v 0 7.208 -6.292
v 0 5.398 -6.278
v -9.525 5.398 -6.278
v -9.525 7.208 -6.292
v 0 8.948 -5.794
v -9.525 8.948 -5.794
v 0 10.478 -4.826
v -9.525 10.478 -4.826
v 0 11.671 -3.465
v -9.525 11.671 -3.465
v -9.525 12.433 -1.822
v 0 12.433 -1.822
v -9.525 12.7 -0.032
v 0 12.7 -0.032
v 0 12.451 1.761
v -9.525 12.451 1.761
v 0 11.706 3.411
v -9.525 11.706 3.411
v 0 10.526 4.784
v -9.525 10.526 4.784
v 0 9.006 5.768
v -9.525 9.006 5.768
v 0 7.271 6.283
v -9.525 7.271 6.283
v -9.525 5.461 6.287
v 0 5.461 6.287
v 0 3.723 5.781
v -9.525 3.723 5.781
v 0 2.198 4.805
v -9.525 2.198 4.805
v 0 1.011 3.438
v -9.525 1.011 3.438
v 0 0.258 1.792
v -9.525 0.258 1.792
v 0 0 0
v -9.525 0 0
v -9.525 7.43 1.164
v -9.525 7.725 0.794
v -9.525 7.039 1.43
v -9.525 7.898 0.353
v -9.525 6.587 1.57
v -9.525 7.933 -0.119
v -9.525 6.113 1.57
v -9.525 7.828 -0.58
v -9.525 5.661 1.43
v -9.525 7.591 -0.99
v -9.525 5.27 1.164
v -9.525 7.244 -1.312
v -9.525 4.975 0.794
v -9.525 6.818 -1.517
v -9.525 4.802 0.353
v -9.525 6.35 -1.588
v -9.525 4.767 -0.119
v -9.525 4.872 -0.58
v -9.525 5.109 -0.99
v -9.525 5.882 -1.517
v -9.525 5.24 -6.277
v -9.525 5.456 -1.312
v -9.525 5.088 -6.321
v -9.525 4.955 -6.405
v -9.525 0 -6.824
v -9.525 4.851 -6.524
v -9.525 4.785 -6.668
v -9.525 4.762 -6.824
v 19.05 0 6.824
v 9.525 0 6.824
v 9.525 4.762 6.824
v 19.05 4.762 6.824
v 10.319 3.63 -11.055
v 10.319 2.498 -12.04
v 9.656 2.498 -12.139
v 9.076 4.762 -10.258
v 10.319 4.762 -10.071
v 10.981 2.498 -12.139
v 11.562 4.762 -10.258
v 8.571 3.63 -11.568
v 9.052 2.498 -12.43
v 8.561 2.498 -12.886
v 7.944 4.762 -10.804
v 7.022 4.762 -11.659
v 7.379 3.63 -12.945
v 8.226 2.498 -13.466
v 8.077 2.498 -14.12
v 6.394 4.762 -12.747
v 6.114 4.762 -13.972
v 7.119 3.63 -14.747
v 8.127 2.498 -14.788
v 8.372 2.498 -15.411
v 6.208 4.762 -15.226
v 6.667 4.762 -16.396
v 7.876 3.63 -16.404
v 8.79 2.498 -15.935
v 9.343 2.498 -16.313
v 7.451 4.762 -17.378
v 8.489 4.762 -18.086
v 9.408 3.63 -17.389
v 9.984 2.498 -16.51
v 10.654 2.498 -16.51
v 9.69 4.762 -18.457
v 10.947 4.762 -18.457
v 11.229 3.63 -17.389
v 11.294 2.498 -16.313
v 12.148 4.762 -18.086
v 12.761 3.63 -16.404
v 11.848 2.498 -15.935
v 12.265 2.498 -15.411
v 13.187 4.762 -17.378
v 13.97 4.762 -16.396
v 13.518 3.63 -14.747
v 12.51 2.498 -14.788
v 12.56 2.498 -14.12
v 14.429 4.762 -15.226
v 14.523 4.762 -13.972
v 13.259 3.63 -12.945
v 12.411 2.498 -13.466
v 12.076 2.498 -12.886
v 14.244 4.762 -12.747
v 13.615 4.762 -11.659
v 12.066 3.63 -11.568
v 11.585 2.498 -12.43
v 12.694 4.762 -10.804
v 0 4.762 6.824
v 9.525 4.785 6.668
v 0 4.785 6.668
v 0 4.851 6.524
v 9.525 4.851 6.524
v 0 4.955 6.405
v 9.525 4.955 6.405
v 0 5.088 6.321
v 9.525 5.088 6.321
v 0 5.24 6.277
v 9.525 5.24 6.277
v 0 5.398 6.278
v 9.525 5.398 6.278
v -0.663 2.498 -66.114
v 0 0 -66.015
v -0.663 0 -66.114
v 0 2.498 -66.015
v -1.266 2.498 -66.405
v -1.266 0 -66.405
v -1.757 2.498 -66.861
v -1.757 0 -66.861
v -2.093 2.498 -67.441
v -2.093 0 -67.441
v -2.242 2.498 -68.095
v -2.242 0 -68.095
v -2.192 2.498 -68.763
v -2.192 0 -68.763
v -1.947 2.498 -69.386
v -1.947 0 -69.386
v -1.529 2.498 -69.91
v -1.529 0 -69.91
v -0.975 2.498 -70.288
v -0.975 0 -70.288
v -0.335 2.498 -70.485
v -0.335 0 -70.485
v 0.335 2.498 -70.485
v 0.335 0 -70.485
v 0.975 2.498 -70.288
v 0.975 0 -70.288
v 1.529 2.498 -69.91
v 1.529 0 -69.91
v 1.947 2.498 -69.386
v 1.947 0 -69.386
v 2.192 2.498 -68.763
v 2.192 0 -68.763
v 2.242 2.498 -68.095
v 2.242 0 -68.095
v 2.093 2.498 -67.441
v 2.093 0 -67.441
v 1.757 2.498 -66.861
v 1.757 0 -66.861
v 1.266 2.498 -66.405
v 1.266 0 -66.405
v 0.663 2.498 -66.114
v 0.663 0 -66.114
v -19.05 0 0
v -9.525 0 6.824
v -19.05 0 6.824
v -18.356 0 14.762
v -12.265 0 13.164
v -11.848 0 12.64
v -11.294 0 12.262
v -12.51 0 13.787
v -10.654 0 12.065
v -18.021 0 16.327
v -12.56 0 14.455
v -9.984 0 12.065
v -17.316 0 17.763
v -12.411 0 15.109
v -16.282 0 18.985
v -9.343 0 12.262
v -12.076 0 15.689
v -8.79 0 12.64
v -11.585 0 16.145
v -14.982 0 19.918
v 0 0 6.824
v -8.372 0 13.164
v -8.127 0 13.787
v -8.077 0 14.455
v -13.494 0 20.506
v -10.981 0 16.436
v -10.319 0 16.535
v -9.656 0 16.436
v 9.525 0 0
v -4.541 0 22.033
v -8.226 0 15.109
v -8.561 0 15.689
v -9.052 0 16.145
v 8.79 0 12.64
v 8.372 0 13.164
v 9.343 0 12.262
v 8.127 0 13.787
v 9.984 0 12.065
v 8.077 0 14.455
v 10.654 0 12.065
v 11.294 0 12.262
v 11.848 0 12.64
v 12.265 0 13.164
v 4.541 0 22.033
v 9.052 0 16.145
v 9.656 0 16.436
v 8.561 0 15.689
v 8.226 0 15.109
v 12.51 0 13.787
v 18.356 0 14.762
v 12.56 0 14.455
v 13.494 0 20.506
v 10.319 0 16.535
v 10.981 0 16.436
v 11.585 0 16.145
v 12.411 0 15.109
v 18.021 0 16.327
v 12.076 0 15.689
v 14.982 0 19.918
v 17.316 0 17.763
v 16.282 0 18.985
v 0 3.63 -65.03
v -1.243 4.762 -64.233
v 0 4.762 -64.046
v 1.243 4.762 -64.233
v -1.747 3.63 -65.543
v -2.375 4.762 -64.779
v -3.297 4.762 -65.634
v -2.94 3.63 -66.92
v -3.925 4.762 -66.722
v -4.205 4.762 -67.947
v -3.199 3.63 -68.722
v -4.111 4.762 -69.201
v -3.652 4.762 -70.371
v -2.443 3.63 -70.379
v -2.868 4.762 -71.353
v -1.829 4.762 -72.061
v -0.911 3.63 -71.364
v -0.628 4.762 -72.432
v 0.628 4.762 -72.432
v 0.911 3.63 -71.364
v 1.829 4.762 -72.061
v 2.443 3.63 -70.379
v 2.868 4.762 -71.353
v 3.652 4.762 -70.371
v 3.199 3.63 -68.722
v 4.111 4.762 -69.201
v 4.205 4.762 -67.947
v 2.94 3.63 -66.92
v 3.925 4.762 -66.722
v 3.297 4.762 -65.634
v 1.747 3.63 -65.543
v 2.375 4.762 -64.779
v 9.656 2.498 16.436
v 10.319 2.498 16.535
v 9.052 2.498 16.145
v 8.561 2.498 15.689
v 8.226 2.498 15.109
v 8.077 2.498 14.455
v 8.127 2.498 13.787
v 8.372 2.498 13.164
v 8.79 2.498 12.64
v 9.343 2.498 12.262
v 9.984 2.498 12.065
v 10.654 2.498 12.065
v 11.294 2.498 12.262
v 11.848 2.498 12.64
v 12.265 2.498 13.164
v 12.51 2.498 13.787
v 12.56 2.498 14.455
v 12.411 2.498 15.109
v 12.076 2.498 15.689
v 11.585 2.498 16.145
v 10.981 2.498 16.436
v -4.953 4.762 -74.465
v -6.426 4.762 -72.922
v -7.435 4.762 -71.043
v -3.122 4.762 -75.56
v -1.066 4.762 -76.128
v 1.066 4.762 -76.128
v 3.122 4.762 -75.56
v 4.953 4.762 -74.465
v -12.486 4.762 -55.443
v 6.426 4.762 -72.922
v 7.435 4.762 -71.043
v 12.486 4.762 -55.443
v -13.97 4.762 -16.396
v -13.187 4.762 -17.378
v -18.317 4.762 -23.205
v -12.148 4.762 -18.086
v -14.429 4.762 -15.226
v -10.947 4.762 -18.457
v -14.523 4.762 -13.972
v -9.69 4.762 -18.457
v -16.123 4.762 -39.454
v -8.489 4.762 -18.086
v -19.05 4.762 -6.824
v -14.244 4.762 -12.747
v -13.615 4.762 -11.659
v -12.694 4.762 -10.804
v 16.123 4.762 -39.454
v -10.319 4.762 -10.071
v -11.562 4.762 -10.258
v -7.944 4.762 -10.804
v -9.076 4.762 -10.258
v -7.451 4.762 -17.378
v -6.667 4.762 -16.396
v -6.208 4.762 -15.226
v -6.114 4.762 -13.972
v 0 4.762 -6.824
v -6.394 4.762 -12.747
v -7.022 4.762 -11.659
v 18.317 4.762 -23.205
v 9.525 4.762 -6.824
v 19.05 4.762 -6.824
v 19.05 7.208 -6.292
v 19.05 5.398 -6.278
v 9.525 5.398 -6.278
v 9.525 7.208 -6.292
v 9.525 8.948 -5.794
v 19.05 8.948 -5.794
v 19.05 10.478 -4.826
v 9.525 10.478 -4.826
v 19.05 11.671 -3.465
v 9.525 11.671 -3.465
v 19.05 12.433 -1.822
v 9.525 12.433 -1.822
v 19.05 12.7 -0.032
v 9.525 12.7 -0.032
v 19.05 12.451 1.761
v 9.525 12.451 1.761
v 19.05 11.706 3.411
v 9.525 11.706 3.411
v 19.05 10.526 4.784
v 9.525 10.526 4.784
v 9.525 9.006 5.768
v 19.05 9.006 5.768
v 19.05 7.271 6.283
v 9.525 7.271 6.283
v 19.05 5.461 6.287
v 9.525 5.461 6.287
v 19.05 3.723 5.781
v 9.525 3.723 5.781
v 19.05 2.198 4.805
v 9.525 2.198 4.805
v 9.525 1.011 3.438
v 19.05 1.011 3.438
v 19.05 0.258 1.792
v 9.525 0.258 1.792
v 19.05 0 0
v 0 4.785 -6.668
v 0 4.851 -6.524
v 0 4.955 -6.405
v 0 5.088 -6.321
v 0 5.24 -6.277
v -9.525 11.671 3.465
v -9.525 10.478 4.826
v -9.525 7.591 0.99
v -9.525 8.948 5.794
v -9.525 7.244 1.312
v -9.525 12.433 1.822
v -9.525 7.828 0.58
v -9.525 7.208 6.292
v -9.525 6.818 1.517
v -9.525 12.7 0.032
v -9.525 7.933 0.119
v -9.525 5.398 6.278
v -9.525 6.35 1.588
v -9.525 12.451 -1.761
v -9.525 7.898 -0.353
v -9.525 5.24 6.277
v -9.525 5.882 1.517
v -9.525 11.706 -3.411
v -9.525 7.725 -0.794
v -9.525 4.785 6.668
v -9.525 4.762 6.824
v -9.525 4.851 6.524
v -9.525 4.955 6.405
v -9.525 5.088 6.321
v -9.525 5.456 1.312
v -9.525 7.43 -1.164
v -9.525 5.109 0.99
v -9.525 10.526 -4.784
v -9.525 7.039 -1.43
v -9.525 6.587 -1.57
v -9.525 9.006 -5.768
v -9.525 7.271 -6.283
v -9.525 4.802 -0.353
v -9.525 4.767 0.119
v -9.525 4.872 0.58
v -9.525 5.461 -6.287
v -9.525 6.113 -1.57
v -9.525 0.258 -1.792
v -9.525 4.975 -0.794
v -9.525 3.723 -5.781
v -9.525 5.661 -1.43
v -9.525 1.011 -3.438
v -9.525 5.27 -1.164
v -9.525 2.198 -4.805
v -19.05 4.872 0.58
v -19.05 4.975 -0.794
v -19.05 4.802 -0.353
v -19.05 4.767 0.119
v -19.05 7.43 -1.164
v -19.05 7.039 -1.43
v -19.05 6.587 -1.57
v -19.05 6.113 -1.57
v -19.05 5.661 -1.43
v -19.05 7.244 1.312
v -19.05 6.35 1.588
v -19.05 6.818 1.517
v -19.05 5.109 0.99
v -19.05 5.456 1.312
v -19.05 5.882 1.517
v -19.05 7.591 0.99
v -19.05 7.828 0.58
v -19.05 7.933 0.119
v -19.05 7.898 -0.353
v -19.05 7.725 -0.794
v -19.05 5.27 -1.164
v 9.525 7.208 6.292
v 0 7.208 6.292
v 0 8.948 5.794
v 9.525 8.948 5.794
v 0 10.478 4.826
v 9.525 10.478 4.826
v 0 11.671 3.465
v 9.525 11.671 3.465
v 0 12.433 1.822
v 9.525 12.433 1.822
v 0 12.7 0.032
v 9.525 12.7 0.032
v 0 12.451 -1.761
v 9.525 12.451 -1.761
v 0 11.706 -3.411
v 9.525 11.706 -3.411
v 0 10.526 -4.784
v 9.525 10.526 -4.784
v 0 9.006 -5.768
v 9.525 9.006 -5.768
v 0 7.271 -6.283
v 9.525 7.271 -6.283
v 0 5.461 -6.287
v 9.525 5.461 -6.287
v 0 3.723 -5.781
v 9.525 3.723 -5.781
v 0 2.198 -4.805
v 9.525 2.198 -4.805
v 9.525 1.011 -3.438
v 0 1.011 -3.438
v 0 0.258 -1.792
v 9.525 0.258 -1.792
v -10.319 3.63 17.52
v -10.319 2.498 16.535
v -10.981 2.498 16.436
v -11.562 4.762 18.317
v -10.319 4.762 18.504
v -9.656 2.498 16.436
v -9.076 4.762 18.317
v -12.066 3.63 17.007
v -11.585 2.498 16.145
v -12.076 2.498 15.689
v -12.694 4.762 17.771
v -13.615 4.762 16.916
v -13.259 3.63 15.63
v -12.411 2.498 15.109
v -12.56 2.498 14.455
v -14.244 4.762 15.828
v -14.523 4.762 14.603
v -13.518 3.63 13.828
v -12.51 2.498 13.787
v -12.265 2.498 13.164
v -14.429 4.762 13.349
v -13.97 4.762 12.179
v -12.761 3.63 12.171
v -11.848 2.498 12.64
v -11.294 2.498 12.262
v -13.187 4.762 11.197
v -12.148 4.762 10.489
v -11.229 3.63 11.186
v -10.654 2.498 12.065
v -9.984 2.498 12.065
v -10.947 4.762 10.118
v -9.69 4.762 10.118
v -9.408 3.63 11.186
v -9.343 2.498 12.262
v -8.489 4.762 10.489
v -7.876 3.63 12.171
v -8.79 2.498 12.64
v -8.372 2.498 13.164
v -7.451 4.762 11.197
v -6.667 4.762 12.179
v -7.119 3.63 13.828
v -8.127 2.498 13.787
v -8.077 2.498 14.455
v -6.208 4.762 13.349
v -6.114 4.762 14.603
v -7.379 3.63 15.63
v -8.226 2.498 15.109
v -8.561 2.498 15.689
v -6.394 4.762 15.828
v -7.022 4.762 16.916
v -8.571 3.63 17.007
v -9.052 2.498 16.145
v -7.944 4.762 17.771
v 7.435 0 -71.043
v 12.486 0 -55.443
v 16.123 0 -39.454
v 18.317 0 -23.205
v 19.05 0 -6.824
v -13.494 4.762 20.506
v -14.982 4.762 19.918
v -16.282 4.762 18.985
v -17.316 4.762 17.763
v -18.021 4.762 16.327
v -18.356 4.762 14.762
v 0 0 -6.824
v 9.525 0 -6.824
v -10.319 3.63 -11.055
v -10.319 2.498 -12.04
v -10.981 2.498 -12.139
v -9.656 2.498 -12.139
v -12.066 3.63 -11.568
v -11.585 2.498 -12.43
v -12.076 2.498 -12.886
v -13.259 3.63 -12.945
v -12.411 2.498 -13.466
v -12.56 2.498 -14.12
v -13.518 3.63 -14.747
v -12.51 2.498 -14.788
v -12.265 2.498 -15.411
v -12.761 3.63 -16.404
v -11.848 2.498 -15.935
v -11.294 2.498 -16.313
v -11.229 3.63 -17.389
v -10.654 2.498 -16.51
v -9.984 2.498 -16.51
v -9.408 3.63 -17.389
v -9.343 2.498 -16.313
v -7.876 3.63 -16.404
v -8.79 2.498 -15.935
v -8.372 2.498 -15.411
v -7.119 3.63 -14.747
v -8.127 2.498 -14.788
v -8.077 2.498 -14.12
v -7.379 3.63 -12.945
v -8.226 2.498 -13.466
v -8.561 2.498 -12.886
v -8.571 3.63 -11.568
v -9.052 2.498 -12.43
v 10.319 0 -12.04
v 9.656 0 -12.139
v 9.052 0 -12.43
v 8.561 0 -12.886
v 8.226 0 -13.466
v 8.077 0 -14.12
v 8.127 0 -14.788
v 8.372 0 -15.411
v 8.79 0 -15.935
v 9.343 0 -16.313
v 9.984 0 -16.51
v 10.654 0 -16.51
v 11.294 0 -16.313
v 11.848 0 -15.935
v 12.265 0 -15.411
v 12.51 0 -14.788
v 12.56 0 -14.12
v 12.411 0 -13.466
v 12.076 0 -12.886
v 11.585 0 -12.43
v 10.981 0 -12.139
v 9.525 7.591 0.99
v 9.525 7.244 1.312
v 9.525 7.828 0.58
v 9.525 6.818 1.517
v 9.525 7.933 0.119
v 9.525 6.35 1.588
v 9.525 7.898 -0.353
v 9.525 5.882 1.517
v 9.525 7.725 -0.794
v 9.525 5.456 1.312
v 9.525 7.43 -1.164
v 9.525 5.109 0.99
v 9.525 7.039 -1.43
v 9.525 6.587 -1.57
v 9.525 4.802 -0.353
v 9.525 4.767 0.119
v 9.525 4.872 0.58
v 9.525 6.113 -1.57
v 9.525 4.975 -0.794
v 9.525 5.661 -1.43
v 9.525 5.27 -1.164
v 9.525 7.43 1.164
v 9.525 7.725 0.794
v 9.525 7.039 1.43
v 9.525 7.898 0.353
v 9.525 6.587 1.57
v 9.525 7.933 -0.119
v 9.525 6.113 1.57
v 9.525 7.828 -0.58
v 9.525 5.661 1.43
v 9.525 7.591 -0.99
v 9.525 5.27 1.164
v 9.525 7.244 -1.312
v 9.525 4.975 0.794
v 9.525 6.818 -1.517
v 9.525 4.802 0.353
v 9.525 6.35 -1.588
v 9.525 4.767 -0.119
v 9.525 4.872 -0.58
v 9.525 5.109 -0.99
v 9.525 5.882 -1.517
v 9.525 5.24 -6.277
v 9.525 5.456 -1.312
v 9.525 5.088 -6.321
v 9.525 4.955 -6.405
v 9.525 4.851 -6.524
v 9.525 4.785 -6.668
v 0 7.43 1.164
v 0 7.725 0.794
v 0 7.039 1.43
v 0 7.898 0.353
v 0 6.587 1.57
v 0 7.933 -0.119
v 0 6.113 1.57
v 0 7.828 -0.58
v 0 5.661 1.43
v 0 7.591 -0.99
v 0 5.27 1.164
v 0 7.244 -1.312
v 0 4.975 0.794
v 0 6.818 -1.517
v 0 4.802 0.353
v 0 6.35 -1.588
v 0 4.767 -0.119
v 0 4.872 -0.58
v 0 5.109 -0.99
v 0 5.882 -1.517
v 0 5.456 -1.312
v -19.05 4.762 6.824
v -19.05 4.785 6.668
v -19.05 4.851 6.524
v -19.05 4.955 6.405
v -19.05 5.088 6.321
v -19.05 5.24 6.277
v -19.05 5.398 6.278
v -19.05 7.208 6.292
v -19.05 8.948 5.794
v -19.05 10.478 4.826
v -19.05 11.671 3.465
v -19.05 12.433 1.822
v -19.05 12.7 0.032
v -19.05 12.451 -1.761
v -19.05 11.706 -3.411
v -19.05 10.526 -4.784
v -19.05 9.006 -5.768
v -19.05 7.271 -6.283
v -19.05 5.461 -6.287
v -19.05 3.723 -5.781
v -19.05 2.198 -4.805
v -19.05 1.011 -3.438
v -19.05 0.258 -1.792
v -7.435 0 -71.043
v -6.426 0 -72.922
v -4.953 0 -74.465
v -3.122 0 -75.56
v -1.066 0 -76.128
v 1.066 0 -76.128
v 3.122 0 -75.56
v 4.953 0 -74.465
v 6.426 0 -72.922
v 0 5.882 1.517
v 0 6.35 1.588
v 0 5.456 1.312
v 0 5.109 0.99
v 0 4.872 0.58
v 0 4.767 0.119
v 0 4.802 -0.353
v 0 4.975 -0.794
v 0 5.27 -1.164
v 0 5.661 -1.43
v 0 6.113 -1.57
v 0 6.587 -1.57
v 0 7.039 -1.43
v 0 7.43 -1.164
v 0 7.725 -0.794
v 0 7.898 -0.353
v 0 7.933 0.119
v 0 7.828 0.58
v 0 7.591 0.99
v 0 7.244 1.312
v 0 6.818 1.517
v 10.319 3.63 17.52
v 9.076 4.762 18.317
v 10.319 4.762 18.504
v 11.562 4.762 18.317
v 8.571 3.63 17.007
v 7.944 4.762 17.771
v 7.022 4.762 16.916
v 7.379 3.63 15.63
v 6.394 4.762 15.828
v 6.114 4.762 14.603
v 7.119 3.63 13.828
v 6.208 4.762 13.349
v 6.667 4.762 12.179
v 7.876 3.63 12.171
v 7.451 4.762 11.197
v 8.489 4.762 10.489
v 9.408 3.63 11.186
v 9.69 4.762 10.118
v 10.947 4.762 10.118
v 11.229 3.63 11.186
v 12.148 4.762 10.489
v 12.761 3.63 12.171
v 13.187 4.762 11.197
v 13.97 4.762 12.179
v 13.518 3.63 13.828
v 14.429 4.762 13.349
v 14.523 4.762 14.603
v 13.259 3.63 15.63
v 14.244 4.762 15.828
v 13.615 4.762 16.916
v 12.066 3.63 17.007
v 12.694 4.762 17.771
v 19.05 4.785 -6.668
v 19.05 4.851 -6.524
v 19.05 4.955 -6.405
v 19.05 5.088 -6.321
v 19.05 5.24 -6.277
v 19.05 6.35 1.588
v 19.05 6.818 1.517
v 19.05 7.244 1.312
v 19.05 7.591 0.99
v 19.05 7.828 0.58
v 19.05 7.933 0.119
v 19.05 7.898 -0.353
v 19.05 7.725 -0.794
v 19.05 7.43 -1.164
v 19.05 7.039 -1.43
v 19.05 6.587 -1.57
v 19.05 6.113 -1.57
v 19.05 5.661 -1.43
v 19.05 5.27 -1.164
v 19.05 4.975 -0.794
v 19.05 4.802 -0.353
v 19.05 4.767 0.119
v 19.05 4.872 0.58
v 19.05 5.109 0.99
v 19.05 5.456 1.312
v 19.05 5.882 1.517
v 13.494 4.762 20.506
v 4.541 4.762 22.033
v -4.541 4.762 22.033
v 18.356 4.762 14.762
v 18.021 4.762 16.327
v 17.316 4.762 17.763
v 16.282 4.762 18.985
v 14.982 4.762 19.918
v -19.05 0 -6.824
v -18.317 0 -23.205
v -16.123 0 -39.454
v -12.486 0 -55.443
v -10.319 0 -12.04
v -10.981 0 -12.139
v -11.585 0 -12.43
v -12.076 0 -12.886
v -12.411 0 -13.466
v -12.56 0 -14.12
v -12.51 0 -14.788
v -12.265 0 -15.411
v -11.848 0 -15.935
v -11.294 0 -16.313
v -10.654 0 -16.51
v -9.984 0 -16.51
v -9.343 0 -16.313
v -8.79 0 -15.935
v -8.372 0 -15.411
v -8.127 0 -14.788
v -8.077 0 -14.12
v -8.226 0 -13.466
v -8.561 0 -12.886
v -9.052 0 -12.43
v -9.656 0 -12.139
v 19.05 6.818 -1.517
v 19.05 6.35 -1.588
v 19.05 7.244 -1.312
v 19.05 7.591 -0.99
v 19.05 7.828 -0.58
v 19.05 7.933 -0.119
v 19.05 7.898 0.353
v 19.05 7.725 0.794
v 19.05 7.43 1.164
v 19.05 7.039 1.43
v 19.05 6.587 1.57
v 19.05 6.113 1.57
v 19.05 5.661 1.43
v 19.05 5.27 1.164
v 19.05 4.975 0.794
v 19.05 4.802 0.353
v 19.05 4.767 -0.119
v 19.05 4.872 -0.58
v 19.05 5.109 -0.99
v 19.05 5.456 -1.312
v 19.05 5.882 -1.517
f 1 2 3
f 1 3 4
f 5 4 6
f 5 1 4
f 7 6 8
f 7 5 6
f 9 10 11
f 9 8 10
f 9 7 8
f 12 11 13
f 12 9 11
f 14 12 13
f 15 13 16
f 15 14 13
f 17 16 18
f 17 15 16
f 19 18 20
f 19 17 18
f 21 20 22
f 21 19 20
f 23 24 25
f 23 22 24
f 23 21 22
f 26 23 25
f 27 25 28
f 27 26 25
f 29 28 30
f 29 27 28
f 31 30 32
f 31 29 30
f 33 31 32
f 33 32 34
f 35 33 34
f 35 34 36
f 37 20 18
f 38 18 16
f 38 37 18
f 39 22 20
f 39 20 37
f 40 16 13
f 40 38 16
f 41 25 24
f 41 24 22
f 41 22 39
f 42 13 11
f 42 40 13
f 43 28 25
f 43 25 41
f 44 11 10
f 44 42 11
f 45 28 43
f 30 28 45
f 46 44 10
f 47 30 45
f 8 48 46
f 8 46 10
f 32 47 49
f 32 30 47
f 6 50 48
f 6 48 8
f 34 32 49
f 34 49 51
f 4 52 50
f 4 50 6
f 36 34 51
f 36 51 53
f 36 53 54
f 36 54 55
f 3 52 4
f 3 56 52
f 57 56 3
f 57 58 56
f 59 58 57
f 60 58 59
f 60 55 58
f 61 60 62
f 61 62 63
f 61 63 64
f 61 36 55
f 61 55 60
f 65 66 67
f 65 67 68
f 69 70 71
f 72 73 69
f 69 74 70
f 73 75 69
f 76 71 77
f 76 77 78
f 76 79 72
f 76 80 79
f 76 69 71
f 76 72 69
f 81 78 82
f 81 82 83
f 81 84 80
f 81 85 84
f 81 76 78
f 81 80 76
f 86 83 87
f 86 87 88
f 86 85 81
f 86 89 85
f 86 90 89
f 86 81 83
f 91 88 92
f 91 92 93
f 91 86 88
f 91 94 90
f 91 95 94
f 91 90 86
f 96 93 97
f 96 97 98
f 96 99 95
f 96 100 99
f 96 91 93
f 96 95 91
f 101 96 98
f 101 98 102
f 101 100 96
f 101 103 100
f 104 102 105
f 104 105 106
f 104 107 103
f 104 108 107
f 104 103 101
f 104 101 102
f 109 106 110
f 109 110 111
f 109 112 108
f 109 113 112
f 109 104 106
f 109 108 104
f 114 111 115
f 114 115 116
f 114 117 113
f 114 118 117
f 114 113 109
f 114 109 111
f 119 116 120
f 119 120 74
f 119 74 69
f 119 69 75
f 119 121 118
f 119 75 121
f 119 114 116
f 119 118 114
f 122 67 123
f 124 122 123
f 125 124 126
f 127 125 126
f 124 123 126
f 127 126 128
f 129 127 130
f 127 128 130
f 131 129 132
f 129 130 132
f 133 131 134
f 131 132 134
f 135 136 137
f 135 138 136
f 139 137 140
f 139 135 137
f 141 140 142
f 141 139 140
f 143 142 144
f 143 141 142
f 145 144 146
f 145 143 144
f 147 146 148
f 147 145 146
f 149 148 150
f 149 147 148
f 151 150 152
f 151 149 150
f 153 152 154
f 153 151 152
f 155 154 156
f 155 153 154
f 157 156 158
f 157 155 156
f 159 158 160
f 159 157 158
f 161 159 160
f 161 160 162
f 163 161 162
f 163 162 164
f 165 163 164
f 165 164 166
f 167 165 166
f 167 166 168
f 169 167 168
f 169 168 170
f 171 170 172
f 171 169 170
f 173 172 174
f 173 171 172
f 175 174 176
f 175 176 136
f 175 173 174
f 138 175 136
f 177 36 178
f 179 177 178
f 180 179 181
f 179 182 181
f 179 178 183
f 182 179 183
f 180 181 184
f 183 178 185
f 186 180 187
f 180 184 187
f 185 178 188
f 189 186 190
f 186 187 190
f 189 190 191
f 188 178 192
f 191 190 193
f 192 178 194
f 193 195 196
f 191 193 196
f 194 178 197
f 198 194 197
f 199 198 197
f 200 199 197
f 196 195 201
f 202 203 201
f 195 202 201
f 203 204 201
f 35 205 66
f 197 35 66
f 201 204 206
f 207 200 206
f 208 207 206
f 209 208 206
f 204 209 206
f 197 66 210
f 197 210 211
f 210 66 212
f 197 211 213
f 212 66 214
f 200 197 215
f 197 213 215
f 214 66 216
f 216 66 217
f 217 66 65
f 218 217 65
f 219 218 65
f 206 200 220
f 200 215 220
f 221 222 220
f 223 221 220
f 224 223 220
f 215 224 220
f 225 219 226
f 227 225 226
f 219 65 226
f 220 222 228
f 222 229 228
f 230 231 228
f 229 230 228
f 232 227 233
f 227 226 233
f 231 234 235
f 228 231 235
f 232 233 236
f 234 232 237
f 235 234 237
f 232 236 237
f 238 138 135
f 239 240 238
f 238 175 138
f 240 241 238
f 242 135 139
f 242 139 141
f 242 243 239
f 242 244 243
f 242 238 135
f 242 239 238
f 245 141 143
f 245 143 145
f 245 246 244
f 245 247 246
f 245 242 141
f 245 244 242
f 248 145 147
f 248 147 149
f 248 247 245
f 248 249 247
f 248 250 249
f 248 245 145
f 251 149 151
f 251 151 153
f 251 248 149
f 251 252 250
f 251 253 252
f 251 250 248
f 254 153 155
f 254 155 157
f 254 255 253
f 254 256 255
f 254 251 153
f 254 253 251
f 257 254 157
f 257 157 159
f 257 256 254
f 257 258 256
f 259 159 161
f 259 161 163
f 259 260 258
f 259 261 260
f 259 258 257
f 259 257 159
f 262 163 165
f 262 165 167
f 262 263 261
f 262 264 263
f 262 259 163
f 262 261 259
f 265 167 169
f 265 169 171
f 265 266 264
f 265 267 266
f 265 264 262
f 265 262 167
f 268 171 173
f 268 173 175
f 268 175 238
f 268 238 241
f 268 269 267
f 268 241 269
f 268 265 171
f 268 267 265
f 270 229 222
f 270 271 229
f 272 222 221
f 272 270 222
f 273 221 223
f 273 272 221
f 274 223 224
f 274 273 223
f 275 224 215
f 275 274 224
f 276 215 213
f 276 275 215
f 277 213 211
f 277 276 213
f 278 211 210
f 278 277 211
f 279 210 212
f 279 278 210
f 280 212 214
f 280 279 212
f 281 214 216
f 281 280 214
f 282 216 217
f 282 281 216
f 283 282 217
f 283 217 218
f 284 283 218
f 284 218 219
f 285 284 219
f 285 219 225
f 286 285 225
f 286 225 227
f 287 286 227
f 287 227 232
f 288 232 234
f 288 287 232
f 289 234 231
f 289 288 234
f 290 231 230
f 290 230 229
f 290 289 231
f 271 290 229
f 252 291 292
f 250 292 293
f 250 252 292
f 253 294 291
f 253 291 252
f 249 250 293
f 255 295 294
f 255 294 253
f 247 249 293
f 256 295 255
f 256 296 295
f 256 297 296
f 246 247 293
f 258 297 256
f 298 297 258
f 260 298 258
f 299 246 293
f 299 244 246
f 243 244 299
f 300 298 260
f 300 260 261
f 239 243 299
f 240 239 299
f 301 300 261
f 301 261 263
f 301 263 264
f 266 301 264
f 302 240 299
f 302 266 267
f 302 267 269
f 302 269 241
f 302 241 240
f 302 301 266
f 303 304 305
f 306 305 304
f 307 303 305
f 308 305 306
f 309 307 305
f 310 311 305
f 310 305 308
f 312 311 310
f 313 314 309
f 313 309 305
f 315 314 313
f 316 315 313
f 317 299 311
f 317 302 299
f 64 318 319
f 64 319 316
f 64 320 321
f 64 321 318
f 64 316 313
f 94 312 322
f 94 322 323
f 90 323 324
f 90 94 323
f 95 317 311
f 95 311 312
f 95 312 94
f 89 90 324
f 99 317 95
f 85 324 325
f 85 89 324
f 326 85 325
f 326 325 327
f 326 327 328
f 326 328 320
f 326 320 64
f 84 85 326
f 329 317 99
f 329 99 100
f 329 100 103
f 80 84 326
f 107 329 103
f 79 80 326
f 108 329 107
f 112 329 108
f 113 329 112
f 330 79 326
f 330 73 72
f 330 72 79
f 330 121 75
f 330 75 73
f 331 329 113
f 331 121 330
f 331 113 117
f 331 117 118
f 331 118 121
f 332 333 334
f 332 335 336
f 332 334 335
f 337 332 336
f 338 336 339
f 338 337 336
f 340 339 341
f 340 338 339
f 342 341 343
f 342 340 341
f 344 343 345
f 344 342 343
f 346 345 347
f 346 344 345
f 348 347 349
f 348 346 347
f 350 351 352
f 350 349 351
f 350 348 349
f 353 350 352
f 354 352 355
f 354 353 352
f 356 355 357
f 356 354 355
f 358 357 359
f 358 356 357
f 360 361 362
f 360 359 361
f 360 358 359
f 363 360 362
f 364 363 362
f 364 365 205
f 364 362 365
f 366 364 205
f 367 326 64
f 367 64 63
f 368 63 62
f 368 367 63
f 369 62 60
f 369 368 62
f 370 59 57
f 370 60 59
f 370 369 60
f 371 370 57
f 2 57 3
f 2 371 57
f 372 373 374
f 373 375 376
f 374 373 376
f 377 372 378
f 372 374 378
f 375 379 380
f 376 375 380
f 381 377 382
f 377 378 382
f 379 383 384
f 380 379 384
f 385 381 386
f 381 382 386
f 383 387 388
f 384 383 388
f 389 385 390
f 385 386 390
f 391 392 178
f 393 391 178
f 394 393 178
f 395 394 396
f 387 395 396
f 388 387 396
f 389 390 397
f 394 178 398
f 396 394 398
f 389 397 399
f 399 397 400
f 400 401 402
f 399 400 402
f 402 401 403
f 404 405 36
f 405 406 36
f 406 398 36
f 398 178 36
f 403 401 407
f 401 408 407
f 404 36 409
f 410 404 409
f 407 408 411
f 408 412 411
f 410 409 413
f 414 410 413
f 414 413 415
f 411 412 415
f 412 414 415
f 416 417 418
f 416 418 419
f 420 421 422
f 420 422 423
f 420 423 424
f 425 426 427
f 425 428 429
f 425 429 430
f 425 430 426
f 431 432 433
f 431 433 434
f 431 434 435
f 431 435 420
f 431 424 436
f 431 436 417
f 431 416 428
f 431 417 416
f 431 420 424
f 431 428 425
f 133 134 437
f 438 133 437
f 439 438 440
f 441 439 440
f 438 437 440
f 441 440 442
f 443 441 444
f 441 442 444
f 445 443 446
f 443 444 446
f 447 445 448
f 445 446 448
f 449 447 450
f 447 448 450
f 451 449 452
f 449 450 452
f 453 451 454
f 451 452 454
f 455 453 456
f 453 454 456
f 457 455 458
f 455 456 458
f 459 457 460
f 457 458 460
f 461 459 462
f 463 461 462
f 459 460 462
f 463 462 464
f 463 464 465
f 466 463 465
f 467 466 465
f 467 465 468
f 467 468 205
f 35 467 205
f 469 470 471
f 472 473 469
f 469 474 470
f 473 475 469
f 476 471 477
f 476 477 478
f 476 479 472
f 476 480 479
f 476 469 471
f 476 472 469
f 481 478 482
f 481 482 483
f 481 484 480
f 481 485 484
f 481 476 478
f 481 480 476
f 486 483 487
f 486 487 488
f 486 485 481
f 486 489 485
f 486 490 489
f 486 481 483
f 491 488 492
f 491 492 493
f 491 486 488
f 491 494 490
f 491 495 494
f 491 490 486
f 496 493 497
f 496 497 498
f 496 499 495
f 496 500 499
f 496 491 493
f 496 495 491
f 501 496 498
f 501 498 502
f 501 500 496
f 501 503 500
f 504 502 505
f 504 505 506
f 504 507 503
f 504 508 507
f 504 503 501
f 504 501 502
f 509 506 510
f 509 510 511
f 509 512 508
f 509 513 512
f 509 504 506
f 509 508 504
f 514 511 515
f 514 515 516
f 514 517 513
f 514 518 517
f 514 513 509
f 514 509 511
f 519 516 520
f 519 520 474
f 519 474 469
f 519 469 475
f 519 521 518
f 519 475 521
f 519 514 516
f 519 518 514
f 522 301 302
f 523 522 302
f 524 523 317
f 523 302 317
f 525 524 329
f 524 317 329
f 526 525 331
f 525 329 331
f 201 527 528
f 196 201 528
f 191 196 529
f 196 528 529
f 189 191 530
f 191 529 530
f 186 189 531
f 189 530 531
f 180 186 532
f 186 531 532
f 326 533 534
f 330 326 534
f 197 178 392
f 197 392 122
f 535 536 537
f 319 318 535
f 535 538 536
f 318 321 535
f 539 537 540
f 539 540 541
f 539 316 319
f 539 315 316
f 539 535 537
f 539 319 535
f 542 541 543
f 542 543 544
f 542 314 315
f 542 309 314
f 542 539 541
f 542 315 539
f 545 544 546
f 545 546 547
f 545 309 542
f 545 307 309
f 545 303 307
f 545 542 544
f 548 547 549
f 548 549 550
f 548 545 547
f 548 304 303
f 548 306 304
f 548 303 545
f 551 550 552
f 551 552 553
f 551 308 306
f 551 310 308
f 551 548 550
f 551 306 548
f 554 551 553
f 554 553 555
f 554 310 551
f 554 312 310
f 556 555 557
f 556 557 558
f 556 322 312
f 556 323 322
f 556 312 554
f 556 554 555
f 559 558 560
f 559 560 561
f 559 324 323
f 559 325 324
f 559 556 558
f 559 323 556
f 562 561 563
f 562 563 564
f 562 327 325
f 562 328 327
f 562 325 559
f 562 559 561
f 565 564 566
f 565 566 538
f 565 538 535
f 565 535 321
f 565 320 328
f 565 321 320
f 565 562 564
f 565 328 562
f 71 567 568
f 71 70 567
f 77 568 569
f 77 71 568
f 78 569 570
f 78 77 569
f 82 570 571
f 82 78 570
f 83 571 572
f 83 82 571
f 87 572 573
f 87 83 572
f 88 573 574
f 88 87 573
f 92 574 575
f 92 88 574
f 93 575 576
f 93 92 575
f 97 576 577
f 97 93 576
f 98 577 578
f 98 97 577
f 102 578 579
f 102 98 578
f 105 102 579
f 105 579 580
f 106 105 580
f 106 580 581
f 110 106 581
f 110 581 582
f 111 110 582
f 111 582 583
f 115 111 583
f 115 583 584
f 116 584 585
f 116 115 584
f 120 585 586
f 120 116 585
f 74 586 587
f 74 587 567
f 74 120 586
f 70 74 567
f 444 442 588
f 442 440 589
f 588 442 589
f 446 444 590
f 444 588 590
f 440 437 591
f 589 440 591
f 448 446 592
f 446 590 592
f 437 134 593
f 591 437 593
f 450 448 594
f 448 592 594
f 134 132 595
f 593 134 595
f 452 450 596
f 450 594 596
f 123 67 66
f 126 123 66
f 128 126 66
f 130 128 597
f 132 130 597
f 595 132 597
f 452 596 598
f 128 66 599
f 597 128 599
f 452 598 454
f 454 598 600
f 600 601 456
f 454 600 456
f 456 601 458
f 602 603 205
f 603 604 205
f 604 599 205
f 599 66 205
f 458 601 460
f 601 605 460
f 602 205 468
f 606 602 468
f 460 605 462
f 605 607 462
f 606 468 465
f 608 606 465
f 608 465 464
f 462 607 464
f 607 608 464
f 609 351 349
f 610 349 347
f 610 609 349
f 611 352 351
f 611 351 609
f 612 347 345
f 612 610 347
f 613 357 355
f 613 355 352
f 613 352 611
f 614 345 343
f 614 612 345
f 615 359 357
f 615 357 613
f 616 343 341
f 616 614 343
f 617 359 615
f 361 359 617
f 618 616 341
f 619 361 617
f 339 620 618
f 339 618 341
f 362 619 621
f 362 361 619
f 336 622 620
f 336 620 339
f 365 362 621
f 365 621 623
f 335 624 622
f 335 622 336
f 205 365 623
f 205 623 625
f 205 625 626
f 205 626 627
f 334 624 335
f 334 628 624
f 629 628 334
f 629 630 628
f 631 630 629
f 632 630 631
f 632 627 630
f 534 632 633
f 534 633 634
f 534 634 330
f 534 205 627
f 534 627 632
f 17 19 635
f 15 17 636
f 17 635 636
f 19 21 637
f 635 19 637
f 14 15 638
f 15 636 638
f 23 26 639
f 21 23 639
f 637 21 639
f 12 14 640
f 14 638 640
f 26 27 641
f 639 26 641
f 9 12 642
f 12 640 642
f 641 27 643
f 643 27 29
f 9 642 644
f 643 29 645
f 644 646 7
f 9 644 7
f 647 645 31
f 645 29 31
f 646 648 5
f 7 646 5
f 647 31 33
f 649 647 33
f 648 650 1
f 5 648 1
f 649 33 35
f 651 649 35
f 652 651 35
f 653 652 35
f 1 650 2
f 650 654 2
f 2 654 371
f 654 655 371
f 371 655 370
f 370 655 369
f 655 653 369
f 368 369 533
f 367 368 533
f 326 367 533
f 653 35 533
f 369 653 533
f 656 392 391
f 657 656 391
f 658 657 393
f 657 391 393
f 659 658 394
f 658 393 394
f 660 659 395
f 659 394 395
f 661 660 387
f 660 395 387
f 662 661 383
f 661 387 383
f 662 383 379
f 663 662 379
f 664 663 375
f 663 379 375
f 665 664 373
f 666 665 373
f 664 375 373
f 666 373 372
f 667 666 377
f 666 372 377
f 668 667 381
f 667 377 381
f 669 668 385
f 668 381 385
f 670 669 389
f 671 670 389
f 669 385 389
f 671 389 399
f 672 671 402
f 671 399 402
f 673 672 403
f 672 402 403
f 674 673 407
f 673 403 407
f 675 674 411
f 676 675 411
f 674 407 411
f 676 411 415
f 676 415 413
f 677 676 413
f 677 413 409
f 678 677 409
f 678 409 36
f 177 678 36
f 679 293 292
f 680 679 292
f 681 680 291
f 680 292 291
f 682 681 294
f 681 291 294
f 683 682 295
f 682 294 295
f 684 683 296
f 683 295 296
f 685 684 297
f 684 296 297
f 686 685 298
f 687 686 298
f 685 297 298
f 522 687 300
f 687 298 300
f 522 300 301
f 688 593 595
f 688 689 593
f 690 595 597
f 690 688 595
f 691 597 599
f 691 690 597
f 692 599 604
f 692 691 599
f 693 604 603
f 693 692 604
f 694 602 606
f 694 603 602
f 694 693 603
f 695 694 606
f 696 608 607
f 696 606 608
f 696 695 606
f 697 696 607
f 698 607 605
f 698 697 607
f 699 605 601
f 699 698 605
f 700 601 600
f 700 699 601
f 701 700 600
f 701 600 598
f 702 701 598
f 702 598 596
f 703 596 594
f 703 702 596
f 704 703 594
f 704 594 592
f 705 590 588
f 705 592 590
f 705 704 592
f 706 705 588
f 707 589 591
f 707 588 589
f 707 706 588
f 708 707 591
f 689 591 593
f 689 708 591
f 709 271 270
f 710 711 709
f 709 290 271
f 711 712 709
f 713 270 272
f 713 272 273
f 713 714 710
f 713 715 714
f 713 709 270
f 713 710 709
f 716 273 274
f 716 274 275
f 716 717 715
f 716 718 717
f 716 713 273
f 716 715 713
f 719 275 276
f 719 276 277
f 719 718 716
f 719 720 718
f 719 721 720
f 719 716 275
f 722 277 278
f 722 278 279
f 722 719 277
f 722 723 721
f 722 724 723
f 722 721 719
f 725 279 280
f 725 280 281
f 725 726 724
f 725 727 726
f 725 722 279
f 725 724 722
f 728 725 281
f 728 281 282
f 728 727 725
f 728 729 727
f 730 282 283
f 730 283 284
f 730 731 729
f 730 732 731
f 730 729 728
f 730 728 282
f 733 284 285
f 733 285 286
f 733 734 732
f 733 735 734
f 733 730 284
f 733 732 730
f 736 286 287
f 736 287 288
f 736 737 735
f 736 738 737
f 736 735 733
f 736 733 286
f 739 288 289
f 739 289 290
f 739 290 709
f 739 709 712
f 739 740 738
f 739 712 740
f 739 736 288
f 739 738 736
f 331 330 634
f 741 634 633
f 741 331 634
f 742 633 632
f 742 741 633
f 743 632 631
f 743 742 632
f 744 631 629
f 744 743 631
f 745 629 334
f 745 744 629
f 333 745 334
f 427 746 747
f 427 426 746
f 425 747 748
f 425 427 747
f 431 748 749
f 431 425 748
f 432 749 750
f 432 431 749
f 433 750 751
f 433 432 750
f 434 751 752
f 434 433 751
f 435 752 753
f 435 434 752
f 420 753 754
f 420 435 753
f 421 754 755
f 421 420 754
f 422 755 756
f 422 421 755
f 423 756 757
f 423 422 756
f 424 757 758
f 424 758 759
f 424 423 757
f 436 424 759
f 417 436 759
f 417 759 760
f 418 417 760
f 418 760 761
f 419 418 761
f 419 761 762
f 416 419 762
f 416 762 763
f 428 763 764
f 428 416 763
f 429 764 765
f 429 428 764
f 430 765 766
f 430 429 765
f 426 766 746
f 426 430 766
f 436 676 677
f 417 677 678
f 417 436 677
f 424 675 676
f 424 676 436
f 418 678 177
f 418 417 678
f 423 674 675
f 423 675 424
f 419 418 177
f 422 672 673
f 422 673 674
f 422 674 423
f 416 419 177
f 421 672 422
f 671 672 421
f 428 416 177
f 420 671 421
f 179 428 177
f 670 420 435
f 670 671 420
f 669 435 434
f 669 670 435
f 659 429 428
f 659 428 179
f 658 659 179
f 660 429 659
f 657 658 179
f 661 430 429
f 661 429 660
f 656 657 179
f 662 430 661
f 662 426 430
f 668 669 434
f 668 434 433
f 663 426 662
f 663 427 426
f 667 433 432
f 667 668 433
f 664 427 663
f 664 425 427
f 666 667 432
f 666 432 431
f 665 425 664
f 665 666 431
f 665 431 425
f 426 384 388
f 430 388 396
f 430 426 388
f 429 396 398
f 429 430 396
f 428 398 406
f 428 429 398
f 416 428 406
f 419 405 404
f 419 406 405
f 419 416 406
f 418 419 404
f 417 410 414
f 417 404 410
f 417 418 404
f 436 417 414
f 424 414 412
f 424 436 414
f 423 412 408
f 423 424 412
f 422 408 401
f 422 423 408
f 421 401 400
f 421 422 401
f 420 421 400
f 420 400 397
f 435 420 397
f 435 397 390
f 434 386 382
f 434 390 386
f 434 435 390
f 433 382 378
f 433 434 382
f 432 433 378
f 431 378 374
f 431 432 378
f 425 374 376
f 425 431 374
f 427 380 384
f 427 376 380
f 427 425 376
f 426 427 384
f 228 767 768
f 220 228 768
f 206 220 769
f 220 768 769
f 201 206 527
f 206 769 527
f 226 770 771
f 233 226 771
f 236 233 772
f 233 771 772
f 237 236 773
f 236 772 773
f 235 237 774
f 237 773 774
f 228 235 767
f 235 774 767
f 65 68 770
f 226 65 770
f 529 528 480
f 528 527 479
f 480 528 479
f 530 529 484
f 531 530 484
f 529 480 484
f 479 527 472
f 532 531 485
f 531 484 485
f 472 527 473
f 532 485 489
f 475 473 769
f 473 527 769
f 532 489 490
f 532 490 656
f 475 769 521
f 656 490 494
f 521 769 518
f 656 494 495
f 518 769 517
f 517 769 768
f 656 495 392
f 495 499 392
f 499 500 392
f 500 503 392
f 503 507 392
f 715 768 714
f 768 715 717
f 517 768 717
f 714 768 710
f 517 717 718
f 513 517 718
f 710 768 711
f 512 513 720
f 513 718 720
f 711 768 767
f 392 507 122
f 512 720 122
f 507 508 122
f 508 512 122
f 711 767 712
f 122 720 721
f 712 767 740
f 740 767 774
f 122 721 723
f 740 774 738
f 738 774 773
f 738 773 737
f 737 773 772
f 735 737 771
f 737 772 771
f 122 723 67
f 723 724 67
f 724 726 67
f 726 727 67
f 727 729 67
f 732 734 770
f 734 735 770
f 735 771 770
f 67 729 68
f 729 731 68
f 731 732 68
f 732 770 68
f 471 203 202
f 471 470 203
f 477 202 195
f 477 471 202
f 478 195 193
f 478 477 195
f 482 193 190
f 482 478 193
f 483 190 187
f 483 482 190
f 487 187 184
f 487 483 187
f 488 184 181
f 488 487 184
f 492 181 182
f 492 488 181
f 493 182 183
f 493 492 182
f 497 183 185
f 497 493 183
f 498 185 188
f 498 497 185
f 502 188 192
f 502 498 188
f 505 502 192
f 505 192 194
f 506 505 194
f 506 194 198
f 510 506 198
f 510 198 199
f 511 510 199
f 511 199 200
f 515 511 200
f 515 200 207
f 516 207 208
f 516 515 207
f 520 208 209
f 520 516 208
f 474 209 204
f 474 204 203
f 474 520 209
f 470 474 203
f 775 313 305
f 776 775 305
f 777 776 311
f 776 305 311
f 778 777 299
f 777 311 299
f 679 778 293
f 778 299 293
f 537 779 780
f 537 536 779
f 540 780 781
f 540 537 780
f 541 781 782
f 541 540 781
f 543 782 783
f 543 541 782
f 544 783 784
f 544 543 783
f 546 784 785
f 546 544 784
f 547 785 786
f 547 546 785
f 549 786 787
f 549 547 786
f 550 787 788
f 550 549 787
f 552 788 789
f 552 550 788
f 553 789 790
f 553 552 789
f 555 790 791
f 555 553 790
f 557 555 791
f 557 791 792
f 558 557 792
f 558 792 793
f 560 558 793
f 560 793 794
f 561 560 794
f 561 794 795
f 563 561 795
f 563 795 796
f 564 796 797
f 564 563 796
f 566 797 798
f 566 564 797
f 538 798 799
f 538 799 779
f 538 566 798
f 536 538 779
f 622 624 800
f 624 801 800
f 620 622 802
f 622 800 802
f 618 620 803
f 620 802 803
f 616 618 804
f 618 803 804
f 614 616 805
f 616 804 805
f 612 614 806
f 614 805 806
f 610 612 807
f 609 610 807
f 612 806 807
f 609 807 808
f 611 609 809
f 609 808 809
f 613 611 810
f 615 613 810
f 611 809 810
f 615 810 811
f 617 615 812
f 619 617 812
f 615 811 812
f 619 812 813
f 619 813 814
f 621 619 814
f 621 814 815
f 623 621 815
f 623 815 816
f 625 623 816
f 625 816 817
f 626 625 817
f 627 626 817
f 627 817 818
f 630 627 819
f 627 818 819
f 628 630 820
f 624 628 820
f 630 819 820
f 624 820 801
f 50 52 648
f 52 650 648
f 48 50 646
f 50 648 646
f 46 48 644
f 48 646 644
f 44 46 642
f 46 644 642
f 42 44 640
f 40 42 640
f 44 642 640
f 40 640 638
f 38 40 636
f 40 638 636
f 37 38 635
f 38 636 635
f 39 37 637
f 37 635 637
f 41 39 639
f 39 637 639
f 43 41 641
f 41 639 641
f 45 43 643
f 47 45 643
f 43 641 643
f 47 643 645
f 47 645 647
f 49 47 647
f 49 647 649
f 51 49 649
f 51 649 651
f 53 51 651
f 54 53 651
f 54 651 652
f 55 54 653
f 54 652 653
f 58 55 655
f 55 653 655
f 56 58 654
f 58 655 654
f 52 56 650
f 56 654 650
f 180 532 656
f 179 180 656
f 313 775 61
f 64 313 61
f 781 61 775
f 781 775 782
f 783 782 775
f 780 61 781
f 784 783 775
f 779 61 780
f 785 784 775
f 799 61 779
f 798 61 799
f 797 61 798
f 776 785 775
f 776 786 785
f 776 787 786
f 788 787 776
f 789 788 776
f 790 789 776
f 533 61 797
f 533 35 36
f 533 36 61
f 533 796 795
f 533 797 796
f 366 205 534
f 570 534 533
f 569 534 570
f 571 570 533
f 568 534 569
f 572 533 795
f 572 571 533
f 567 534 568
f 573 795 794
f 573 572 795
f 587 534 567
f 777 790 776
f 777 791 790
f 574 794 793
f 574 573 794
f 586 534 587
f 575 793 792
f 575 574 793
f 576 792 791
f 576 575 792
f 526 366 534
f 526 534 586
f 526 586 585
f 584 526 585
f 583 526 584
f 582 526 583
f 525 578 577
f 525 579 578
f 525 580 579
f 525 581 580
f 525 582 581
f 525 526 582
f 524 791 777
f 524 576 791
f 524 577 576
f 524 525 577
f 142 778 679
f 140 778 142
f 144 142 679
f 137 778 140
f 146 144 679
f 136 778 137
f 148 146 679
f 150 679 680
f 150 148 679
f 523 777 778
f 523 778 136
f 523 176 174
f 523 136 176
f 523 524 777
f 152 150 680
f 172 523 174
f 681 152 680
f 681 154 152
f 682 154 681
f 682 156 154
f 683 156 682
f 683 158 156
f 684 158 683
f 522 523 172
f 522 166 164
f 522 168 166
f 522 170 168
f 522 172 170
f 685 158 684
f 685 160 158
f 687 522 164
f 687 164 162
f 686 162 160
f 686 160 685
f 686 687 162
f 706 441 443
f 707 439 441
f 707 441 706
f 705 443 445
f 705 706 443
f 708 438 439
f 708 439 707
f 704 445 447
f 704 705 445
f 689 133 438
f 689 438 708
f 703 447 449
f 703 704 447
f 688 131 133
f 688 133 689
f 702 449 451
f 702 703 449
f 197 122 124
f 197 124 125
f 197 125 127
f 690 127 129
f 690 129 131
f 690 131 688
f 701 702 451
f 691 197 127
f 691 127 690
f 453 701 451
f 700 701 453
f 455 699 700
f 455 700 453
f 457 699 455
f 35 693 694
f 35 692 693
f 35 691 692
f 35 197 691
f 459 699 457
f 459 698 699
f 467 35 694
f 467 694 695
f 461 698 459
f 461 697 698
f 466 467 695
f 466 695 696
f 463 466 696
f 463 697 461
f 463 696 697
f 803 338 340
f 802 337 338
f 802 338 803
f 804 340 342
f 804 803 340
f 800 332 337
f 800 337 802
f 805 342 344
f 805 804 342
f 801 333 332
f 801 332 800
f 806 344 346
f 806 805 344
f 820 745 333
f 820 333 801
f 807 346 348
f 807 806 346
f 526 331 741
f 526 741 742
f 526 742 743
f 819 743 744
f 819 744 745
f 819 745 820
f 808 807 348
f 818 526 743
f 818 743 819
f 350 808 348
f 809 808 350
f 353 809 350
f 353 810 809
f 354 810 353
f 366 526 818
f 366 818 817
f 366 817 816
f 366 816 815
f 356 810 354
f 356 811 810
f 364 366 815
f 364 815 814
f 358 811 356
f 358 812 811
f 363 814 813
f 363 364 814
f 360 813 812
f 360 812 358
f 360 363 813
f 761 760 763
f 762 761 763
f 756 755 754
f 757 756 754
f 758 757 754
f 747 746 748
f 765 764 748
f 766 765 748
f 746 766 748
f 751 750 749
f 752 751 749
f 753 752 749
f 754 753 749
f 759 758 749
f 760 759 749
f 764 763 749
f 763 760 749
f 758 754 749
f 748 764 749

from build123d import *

# Parameters (mm, degrees)
SKETCH2_R                                     = 1.5875
EXTRUDE1_DEPTH                                = 19.05
SKETCH24_W                                    = 9.525
SKETCH24_H                                    = 13.174082694
CUT_EXTRUDE5_DEPTH                            = 32.908355097
EXTRUDE2_REACH                                = 33.908
SKETCH4_R                                     = 1.5875
EXTRUDE2_DIRECTION_2_REACH                    = 33.908
SKETCH25_W                                    = 9.525
SKETCH25_H                                    = 13.174082694
CUT_EXTRUDE6_DEPTH                            = 80.565271947
SKETCH7_W                                     = 38.1
SKETCH7_H                                     = 1.5875
CUT_EXTRUDE4_DEPTH                            = 1056.132
CSK_FOR_8_FLAT_HEAD_MACHINE_SCREW1_AT_2_COUNT = 2
CSK_FOR_8_FLAT_HEAD_MACHINE_SCREW1_AT_2_PITCH = 54.95249973
CSK_FOR_8_FLAT_HEAD_MACHINE_SCREW1_AT_3_COUNT = 2
CSK_FOR_8_FLAT_HEAD_MACHINE_SCREW1_AT_3_PITCH = 54.95249973
CSK_FOR_8_FLAT_HEAD_MACHINE_SCREW1_AT_4_COUNT = 2
CSK_FOR_8_FLAT_HEAD_MACHINE_SCREW1_AT_4_PITCH = 83.19242214
CSK_FOR_8_FLAT_HEAD_MACHINE_SCREW1_AT_5_COUNT = 2
CSK_FOR_8_FLAT_HEAD_MACHINE_SCREW1_AT_5_PITCH = 83.19242214


with BuildPart() as part:
    # Sketch2 → Extrude1 (new, symmetric)
    with BuildSketch(Plane(origin=(0, 0, 0), x_dir=(0, 0, -1), z_dir=(1, 0, 0))):
        with BuildLine():
            Line((0, 0), (-22.225, 0))
            Line((-22.225, 0), (-22.225, 4.7625))
            Line((-22.225, 4.7625), (-6.824082694, 4.7625))
            ThreePointArc((-6.824082694, 4.7625), (-6.405376094, 4.954700563), (-6.278156079, 5.3975))
            ThreePointArc((-6.278156079, 5.3975), (4.139693527, 11.165125907), (0, 0))
        make_face()
        with Locations(Location((0, 6.35, 0), (0, 0, 180))):
            Circle(SKETCH2_R, mode=Mode.SUBTRACT)
    extrude(amount=EXTRUDE1_DEPTH, both=True)

    # Sketch24 → Cut-Extrude5 (cut, through all)
    with BuildSketch(Plane(origin=(0, 0, 0), x_dir=(1, 0, 0), z_dir=(0, 1, 0))):
        with Locations((-4.7625, -0.237041347)):
            Rectangle(SKETCH24_W, SKETCH24_H)
        with Locations((14.2875, -0.237041347)):
            Rectangle(SKETCH24_W, SKETCH24_H)
    extrude(amount=CUT_EXTRUDE5_DEPTH, mode=Mode.SUBTRACT)


with BuildPart() as body_2:

    # Extrude2: up to this face of the body (flat: up to its plane)
    extrude2_end = Plane(part.part.faces().sort_by_distance((19.05, 2.38125, 14.524541347))[0])
    # Sketch4 → Extrude2 (new, up to the picked face)
    with BuildSketch(Plane(origin=(0, 0, 0), x_dir=(0, 0, -1), z_dir=(1, 0, 0)), mode=Mode.PRIVATE) as extrude2_sk1:
        with BuildLine():
            Line((0, 0), (76.2, 0))
            Line((76.2, 0), (76.2, 4.7625))
            Line((76.2, 4.7625), (6.824082694, 4.7625))
            ThreePointArc((6.824082694, 4.7625), (6.405376094, 4.954700563), (6.278156079, 5.3975))
            ThreePointArc((6.278156079, 5.3975), (-4.139693527, 11.165125907), (0, 0))
        make_face()
        with Locations((0, 6.35)):
            Circle(SKETCH4_R, mode=Mode.SUBTRACT)
    extrude2_tool1 = split(extrude(extrude2_sk1.sketch, amount=EXTRUDE2_REACH, mode=Mode.PRIVATE), bisect_by=extrude2_end, keep=Keep.BOTH, mode=Mode.PRIVATE)
    add(extrude2_tool1.solids().sort_by(Axis((0, 3.387521, -29.937406), (1, 0, 0)))[0])


    # Extrude2 direction 2: up to this face of the body (flat: up to its plane)
    extrude2_direction_2_end = Plane(part.part.faces().sort_by_distance((-19.05, 4.661678537, 5.530933407))[0])
    # Sketch4 → Extrude2 direction 2 (add, up to the picked face)
    with BuildSketch(Plane(origin=(0, 0, 0), x_dir=(0, 0, -1), z_dir=(1, 0, 0)), mode=Mode.PRIVATE) as extrude2_direction_2_sk1:
        with BuildLine():
            Line((0, 0), (76.2, 0))
            Line((76.2, 0), (76.2, 4.7625))
            Line((76.2, 4.7625), (6.824082694, 4.7625))
            ThreePointArc((6.824082694, 4.7625), (6.405376094, 4.954700563), (6.278156079, 5.3975))
            ThreePointArc((6.278156079, 5.3975), (-4.139693527, 11.165125907), (0, 0))
        make_face()
        with Locations((0, 6.35)):
            Circle(SKETCH4_R, mode=Mode.SUBTRACT)
    extrude2_direction_2_tool1 = split(extrude(extrude2_direction_2_sk1.sketch, amount=-EXTRUDE2_DIRECTION_2_REACH, mode=Mode.PRIVATE), bisect_by=extrude2_direction_2_end, keep=Keep.BOTH, mode=Mode.PRIVATE)
    add(extrude2_direction_2_tool1.solids().sort_by(Axis((0, 3.387521, -29.937406), (-1, 0, 0)))[0])

    # Sketch25 → Cut-Extrude6 (cut, through all)
    with BuildSketch(Plane(origin=(0, 0, 0), x_dir=(1, 0, 0), z_dir=(0, 1, 0))):
        with Locations((-14.2875, 0.237041347)):
            Rectangle(SKETCH25_W, SKETCH25_H)
        with Locations((4.7625, 0.237041347)):
            Rectangle(SKETCH25_W, SKETCH25_H)
    extrude(amount=CUT_EXTRUDE6_DEPTH, mode=Mode.SUBTRACT)


with BuildPart() as body_3:
    # Sketch7 → Revolve1 (revolve)
    with BuildSketch(Plane(origin=(0, 6.35, 0), x_dir=(-1, 0, 0), z_dir=(0, 1, 0)), mode=Mode.PRIVATE) as revolve1_sk:
        with Locations((0, -0.79375)):
            Rectangle(SKETCH7_W, SKETCH7_H)
    revolve(revolve1_sk.sketch.rotate(Axis((19.05, 6.35, 0), (-1, 0, 0)), 180), axis=Axis((19.05, 6.35, 0), (-1, 0, 0)))


with BuildPart() as cut_extrude4_tool:
    # Sketch8 → Cut-Extrude4 (new body)
    with BuildSketch(Plane(origin=(0, 4.7625, 0), x_dir=(-1, 0, 0), z_dir=(0, 1, 0))):
        with BuildLine():
            Line((-19.05, -6.824082694), (-22.119129983, -6.824082694))
            Line((-22.119129983, -6.824082694), (-22.119129983, -80.12356523))
            Line((-22.119129983, -80.12356523), (22.119129983, -80.12356523))
            Line((22.119129983, -80.12356523), (22.119129983, -6.824082694))
            Line((22.119129983, -6.824082694), (19.05, -6.824082694))
            ThreePointArc((19.05, -6.824082694), (16.122782432, -39.454483022), (7.434605523, -71.042886119))
            ThreePointArc((7.434605523, -71.042886119), (0, -76.2), (-7.434605523, -71.042886119))
            ThreePointArc((-7.434605523, -71.042886119), (-16.122782432, -39.454483022), (-19.05, -6.824082694))
        make_face()
        with BuildLine():
            Line((-19.05, 6.824082694), (-18.355558733, 14.761582694))
            ThreePointArc((-18.355558733, 14.761582694), (-16.836967363, 18.406050054), (-13.49375, 20.506326167))
            ThreePointArc((-13.49375, 20.506326167), (0, 22.225), (13.49375, 20.506326167))
            ThreePointArc((13.49375, 20.506326167), (16.836967363, 18.406050054), (18.355558733, 14.761582694))
            Line((18.355558733, 14.761582694), (19.05, 6.824082694))
            Line((19.05, 6.824082694), (22.119129983, 6.824082694))
            Line((22.119129983, 6.824082694), (22.119129983, 26.600148172))
            Line((22.119129983, 26.600148172), (-22.119129983, 26.600148172))
            Line((-22.119129983, 26.600148172), (-22.119129983, 6.824082694))
            Line((-22.119129983, 6.824082694), (-19.05, 6.824082694))
        make_face()
    extrude(amount=-CUT_EXTRUDE4_DEPTH)


with BuildPart() as part_1:
    add(part.part)

    # Cut-Extrude4: cut by cut_extrude4_tool
    add(cut_extrude4_tool.part, mode=Mode.SUBTRACT)


with BuildPart() as body_2_1:
    add(body_2.part)

    # Cut-Extrude4: cut by cut_extrude4_tool
    add(cut_extrude4_tool.part, mode=Mode.SUBTRACT)

    # Sketch13 → CSK for #8 Flat Head Machine Screw1 (revolve, cut)
    with BuildSketch(Plane(origin=(0, 4.7625, -68.2625), x_dir=(0, 0, 1), z_dir=(1, 0, 0))):
        Polygon((0, 0), (0, 4.7625), (2.2479, 4.7625), (2.2479, 2.26450021), (4.2164, 0), align=None)
    csk_for_8_flat_head_machine_screw1 = revolve(axis=Axis((0, 11.1125, -68.2625), (0, -1, 0)), mode=Mode.SUBTRACT)

    # CSK for #8 Flat Head Machine Screw1 at 2: CSK for #8 Flat Head Machine Screw1 ×2
    with Locations(*[Vector(-0.18777580730124982, 0, 0.9822119151142303) * (i * CSK_FOR_8_FLAT_HEAD_MACHINE_SCREW1_AT_2_PITCH) for i in range(1, CSK_FOR_8_FLAT_HEAD_MACHINE_SCREW1_AT_2_COUNT)]):
        add(csk_for_8_flat_head_machine_screw1, mode=Mode.SUBTRACT)

    # CSK for #8 Flat Head Machine Screw1 at 3: CSK for #8 Flat Head Machine Screw1 ×2
    with Locations(*[Vector(0.18777580730125004, 0, 0.9822119151142303) * (i * CSK_FOR_8_FLAT_HEAD_MACHINE_SCREW1_AT_3_PITCH) for i in range(1, CSK_FOR_8_FLAT_HEAD_MACHINE_SCREW1_AT_3_COUNT)]):
        add(csk_for_8_flat_head_machine_screw1, mode=Mode.SUBTRACT)


with BuildPart() as part_2:
    add(part_1.part)

    # CSK for #8 Flat Head Machine Screw1 at 4: CSK for #8 Flat Head Machine Screw1 ×2
    with Locations(*[Vector(-0.12403473458920831, 0, 0.9922778767136677) * (i * CSK_FOR_8_FLAT_HEAD_MACHINE_SCREW1_AT_4_PITCH) for i in range(1, CSK_FOR_8_FLAT_HEAD_MACHINE_SCREW1_AT_4_COUNT)]):
        add(csk_for_8_flat_head_machine_screw1, mode=Mode.SUBTRACT)

    # CSK for #8 Flat Head Machine Screw1 at 5: CSK for #8 Flat Head Machine Screw1 ×2
    with Locations(*[Vector(0.12403473458920854, 0, 0.9922778767136676) * (i * CSK_FOR_8_FLAT_HEAD_MACHINE_SCREW1_AT_5_PITCH) for i in range(1, CSK_FOR_8_FLAT_HEAD_MACHINE_SCREW1_AT_5_COUNT)]):
        add(csk_for_8_flat_head_machine_screw1, mode=Mode.SUBTRACT)


solid = Compound([body_3.part, body_2_1.part, part_2.part])
